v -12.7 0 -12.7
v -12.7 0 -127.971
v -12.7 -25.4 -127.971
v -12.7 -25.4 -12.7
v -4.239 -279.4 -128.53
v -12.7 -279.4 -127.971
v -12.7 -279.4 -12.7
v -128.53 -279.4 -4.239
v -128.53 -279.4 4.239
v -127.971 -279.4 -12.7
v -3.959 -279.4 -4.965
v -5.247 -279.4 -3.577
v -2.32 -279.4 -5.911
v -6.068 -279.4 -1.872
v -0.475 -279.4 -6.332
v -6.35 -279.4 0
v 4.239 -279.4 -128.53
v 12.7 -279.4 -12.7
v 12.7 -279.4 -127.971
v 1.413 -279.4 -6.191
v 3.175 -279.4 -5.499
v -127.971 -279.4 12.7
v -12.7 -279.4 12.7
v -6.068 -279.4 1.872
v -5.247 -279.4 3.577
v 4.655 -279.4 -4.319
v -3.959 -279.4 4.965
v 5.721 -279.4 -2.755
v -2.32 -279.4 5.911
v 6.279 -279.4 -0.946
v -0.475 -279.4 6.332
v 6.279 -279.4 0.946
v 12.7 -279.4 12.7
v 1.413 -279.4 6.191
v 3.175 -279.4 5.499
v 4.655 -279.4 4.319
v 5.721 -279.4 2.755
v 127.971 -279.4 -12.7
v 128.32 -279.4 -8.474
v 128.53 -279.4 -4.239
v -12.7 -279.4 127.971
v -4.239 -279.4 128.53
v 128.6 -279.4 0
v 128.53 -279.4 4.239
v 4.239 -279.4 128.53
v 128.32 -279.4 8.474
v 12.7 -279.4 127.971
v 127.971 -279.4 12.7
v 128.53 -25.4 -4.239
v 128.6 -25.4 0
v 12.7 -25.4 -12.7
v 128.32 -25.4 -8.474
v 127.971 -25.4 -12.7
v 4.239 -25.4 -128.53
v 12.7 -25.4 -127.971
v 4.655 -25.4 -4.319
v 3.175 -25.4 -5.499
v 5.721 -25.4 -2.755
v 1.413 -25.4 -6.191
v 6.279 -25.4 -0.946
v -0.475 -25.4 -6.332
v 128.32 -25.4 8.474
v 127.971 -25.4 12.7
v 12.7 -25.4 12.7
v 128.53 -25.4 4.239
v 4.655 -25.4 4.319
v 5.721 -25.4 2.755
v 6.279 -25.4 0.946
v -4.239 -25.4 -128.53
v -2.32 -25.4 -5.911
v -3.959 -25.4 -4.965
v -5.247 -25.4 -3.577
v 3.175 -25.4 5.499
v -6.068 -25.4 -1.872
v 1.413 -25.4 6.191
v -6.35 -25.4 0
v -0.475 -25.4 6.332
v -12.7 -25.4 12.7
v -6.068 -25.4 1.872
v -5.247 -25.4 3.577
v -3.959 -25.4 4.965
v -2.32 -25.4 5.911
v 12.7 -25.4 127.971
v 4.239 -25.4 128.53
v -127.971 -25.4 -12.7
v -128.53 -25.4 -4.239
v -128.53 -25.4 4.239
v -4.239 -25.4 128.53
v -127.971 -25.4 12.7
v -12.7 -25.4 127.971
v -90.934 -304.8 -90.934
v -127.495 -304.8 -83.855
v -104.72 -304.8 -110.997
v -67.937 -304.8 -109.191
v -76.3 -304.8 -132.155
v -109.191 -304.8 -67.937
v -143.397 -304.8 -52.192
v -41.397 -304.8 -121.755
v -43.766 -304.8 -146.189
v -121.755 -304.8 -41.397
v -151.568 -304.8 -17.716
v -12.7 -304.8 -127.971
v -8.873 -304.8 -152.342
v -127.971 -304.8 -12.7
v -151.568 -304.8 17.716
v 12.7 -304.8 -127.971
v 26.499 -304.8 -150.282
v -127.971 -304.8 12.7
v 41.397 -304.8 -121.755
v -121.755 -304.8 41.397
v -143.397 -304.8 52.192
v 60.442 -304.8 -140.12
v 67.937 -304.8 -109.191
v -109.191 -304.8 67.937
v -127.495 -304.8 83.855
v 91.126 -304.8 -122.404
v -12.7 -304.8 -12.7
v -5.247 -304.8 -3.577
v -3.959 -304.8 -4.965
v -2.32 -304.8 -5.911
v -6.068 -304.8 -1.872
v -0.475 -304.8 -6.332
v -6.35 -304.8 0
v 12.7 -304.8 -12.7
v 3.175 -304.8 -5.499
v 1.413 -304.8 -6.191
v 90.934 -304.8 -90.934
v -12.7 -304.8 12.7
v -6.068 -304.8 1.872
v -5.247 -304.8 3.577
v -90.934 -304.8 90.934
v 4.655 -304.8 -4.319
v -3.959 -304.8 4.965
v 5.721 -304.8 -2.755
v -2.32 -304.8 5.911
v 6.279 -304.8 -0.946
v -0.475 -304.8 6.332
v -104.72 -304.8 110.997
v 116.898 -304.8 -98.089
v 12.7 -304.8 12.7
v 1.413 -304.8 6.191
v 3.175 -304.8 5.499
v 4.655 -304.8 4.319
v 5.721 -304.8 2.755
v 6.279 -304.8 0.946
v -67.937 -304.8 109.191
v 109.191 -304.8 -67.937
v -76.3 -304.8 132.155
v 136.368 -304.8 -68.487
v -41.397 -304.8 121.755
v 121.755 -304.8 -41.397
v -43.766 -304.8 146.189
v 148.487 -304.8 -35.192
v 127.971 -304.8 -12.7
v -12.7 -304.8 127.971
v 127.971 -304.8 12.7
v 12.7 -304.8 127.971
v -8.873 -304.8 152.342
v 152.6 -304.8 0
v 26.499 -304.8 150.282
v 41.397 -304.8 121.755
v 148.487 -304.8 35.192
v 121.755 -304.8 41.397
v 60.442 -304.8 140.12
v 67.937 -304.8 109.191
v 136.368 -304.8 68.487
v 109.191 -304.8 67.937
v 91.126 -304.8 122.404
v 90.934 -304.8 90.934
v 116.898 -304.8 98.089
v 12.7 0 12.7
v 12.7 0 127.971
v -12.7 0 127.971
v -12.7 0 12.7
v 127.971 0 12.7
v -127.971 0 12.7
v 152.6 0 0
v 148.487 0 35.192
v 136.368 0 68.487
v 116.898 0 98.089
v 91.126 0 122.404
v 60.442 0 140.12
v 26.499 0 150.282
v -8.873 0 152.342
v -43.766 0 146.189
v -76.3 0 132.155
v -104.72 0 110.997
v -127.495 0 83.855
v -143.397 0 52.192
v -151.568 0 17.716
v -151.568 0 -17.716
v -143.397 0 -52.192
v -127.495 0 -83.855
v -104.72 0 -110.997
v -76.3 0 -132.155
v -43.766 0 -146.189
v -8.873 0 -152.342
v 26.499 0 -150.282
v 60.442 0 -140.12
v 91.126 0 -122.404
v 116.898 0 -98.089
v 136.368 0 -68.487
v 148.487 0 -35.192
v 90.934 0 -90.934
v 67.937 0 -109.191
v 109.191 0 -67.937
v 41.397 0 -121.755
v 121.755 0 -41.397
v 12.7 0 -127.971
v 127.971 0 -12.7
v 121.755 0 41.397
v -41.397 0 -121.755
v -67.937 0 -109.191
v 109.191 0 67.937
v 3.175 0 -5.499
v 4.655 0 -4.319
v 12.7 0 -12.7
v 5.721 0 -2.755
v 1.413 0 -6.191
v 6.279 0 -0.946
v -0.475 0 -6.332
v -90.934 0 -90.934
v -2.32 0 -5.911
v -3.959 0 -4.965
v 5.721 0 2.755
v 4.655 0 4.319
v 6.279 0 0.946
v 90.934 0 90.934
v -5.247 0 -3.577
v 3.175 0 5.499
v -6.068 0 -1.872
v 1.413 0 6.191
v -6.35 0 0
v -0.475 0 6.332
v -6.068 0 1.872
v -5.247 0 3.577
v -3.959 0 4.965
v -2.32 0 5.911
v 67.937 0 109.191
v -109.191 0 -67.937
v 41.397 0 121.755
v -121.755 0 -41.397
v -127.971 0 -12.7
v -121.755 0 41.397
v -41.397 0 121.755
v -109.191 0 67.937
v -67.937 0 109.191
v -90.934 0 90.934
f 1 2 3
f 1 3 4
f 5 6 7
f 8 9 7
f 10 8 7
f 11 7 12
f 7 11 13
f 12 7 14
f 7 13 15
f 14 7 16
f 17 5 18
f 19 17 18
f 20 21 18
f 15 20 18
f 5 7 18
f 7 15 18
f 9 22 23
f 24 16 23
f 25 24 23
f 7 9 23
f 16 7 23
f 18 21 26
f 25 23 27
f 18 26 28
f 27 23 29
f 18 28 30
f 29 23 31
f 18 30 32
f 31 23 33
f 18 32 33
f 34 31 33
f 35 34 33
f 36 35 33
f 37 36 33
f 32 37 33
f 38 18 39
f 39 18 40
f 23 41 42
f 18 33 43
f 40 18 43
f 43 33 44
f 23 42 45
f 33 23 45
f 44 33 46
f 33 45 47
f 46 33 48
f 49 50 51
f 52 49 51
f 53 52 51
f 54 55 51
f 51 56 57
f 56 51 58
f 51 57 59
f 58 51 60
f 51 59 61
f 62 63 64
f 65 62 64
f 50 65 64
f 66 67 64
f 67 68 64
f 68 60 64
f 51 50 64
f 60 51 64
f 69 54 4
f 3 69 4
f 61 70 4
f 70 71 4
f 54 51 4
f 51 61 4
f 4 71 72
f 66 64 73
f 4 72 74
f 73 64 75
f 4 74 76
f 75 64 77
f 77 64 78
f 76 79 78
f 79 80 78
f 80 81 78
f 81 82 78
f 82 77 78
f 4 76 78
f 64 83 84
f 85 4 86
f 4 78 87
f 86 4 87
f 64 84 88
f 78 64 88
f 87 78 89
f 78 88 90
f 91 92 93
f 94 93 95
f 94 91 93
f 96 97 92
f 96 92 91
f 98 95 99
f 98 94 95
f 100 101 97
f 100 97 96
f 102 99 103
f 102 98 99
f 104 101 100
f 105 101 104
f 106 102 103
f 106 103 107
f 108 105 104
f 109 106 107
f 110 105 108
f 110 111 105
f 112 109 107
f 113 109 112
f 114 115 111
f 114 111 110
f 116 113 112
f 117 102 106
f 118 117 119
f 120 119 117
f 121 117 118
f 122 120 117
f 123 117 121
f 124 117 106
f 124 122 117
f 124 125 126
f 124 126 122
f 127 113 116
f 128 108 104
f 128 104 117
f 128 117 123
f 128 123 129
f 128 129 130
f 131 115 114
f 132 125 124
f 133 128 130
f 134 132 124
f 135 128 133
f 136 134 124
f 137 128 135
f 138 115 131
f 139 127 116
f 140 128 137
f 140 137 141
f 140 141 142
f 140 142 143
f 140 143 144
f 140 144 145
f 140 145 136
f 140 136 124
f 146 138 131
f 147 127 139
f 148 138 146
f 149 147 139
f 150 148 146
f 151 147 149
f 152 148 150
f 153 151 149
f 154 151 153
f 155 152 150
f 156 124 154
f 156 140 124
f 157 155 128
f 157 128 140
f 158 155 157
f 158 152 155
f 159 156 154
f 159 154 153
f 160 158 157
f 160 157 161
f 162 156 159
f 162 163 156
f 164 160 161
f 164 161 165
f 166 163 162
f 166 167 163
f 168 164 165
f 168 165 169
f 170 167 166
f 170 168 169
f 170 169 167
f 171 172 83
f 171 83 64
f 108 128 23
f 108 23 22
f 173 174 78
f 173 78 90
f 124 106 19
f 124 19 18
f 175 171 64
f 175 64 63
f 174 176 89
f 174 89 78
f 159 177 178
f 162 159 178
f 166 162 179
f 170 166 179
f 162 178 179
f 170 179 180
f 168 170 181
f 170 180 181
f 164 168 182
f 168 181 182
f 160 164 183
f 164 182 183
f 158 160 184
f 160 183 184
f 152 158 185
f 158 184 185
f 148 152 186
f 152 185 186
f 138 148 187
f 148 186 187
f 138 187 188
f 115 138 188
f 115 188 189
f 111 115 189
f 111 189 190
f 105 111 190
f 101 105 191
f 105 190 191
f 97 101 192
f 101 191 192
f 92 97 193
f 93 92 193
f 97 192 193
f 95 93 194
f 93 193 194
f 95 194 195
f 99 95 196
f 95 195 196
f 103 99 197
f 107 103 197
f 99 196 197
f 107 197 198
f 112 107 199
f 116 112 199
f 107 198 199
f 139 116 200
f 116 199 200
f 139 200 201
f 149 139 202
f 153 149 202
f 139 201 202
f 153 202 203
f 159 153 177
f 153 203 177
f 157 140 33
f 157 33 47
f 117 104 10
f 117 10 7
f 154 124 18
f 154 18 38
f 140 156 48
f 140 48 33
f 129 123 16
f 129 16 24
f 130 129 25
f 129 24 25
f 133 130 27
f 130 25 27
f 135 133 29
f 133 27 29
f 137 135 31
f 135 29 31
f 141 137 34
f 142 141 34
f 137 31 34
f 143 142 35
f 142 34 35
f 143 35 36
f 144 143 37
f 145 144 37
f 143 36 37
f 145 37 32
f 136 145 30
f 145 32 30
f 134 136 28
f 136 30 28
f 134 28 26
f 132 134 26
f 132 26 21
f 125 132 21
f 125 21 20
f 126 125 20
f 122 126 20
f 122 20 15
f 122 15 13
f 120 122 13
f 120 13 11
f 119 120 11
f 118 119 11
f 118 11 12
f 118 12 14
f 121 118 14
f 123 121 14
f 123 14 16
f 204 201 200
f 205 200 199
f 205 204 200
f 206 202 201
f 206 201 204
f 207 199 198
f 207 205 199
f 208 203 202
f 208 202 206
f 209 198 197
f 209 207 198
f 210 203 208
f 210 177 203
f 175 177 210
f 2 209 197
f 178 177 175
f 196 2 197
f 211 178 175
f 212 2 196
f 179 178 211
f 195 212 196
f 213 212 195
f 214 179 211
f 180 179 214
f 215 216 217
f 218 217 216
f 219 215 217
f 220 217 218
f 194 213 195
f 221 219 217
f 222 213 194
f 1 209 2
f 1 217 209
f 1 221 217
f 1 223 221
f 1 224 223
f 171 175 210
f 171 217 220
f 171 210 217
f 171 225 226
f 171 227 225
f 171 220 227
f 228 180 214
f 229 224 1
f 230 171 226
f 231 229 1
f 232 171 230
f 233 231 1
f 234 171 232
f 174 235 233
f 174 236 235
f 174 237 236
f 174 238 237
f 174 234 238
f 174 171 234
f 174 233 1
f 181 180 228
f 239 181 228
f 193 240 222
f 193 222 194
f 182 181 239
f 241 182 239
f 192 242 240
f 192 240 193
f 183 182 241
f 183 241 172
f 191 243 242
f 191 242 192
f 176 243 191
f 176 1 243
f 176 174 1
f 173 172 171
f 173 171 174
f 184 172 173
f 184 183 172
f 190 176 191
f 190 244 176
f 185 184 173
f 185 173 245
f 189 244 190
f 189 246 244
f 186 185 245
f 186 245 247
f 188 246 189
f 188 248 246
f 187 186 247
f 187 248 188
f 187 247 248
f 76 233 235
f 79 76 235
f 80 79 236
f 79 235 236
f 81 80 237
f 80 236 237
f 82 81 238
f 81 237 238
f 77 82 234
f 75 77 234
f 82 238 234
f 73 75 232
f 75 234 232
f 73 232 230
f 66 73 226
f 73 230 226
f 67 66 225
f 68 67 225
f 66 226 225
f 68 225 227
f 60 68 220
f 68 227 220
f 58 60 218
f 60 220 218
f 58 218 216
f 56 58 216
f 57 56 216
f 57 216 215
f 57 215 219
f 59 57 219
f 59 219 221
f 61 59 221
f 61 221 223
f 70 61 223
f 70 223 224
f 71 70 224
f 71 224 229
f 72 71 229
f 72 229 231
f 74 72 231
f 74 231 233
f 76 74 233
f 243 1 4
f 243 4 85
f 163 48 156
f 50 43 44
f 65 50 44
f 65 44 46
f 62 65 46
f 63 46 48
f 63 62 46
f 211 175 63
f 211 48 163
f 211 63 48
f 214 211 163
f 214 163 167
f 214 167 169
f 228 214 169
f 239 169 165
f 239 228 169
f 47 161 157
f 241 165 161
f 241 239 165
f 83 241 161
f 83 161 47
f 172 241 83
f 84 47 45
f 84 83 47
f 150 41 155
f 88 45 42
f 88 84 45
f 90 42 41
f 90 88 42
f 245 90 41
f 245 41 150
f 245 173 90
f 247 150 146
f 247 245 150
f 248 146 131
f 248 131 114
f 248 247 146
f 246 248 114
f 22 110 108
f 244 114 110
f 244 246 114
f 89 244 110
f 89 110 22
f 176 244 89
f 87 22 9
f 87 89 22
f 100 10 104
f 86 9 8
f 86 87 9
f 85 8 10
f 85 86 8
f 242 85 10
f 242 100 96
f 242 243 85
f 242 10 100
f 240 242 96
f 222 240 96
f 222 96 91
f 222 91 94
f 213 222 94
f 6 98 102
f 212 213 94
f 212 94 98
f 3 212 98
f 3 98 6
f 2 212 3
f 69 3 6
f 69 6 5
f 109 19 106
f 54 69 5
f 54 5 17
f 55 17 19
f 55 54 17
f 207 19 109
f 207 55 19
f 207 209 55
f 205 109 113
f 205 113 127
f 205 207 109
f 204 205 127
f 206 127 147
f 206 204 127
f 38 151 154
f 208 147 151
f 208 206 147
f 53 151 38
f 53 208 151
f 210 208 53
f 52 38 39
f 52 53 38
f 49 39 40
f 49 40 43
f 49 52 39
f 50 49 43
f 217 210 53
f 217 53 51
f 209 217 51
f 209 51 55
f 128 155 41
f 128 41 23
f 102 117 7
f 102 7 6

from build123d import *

# Parameters (mm, degrees)
F0_R     = 152.6
F0_R_2   = 128.6
F1_DEPTH = 304.8
F3_DEPTH = 25.4
F5_DEPTH = 25.4
F6_R     = 6.35
F7_DEPTH = 382


with BuildPart() as f1:
    # F0 (on Front) → F1 (new body)
    with BuildSketch(Plane.XZ):
        Circle(F0_R)
        Circle(F0_R_2, mode=Mode.SUBTRACT)
    extrude(amount=F1_DEPTH)

    # F2 (on face) → F3 (join)
    with BuildSketch(Plane.XZ.offset(304.8)):
        with BuildLine():
            ThreePointArc((12.7, 127.9713639843), (0, 128.6), (-12.7, 127.9713639843))
            Line((-12.7, 127.9713639843), (-12.7, 12.7))
            Line((-12.7, 12.7), (-12.7, -12.7))
            Line((-12.7, -12.7), (-12.7, -127.9713639843))
            ThreePointArc((-12.7, -127.9713639843), (0, -128.6), (12.7, -127.9713639843))
            Line((12.7, -127.9713639843), (12.7, -12.7))
            Line((12.7, -12.7), (12.7, 12.7))
            Line((12.7, 12.7), (12.7, 127.9713639843))
        make_face()
        with BuildLine():
            Line((-12.7, -12.7), (-12.7, 12.7))
            Line((-12.7, 12.7), (-127.9713639843, 12.7))
            ThreePointArc((-127.9713639843, 12.7), (-128.6, 0), (-127.9713639843, -12.7))
            Line((-127.9713639843, -12.7), (-12.7, -12.7))
        make_face()
        with BuildLine():
            Line((127.9713639843, 12.7), (12.7, 12.7))
            Line((12.7, 12.7), (12.7, -12.7))
            Line((12.7, -12.7), (127.9713639843, -12.7))
            ThreePointArc((127.9713639843, -12.7), (128.6, 0), (127.9713639843, 12.7))
        make_face()
        with BuildLine():
            Line((127.9713639843, 12.7), (12.7, 12.7))
            Line((12.7, 12.7), (12.7, -12.7))
            Line((12.7, -12.7), (127.9713639843, -12.7))
            ThreePointArc((127.9713639843, -12.7), (128.4427448484, -6.3577744384), (128.6, 0))
            ThreePointArc((128.6, 0), (128.4427448484, 6.3577744384), (127.9713639843, 12.7))
        make_face()
    extrude(amount=-F3_DEPTH)

    # F4 (on face) → F5 (join)
    with BuildSketch(Plane(origin=(0, 0, 0), x_dir=(-1, 0, 0), z_dir=(0, 1, 0))):
        with BuildLine():
            Line((-12.7, 127.9713639843), (-12.7, 12.7))
            Line((-12.7, 12.7), (-127.9713639843, 12.7))
            ThreePointArc((-127.9713639843, 12.7), (-128.6, 0), (-127.9713639843, -12.7))
            Line((-127.9713639843, -12.7), (-12.7, -12.7))
            Line((-12.7, -12.7), (-12.7, -127.9713639843))
            ThreePointArc((-12.7, -127.9713639843), (0, -128.6), (12.7, -127.9713639843))
            Line((12.7, -127.9713639843), (12.7, -12.7))
            Line((12.7, -12.7), (127.9713639843, -12.7))
            ThreePointArc((127.9713639843, -12.7), (128.4427448484, -6.3577744384), (128.6, 0))
            ThreePointArc((128.6, 0), (128.4427448484, 6.3577744384), (127.9713639843, 12.7))
            Line((127.9713639843, 12.7), (12.7, 12.7))
            Line((12.7, 12.7), (12.7, 127.9713639843))
            ThreePointArc((12.7, 127.9713639843), (0, 128.6), (-12.7, 127.9713639843))
        make_face()
    extrude(amount=-F5_DEPTH)

    # F6 (on face) → F7 (cut)
    with BuildSketch(Plane(origin=(0, 0, 0), x_dir=(-1, 0, 0), z_dir=(0, 1, 0))):
        Circle(F6_R)
    extrude(amount=-F7_DEPTH, mode=Mode.SUBTRACT)


solid = f1.part
